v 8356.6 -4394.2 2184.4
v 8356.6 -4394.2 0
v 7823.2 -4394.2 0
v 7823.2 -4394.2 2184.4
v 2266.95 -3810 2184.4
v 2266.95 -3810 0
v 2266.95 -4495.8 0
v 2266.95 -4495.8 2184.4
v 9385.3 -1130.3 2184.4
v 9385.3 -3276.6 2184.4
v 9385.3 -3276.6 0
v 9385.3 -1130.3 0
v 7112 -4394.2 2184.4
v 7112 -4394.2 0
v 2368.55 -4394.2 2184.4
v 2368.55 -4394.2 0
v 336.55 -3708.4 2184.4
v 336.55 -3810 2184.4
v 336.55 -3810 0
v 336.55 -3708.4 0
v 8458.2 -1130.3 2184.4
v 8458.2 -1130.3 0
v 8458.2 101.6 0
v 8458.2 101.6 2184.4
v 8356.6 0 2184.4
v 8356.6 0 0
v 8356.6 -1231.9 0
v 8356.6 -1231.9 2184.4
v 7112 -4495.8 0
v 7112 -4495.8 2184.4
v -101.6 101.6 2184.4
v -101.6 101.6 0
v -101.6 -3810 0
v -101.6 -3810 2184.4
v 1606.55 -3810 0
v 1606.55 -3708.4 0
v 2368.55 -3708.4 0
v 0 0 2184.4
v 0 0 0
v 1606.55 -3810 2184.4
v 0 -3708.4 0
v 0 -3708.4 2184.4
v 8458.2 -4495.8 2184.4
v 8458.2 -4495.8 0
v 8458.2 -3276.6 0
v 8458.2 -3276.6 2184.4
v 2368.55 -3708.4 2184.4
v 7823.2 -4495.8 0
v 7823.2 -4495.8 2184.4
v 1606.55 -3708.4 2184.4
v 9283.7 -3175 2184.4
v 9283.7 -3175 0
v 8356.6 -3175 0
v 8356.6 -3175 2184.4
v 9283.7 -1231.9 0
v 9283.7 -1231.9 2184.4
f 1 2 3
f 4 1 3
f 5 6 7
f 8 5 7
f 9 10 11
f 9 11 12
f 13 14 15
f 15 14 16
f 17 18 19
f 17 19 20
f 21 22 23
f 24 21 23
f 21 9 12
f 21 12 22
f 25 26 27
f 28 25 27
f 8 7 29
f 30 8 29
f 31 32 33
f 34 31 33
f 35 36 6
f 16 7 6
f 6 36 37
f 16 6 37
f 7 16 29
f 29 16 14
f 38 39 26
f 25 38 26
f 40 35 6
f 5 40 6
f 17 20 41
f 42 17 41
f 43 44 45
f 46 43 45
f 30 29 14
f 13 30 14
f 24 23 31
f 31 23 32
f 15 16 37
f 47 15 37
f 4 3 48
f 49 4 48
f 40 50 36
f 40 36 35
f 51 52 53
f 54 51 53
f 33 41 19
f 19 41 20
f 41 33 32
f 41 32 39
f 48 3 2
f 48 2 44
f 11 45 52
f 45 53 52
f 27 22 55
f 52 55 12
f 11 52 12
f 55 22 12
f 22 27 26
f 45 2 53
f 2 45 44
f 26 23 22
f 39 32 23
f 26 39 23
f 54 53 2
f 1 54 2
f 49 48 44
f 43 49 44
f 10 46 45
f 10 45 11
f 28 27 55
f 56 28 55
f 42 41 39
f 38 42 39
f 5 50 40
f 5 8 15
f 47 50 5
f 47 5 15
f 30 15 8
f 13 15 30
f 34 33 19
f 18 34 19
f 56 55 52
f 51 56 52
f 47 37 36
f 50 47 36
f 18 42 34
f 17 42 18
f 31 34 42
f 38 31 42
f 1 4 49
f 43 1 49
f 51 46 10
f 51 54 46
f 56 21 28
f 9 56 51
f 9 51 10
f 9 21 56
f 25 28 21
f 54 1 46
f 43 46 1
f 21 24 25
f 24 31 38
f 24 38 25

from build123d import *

# Parameters (mm, degrees)
F1_DEPTH = 2184.4


with BuildPart() as f1:
    # F0 (on Top) → F1 (new body)
    with BuildSketch(Plane.XY):
        Polygon((0, -3708.4), (0, 0), (812.8, 0), (3048, 0), (8356.6, 0), (8356.6, -1231.9), (9283.7, -1231.9), (9283.7, -3175), (8356.6, -3175), (8356.6, -4394.2), (7823.2, -4394.2), (7823.2, -4495.8), (8458.2, -4495.8), (8458.2, -3276.6), (9385.3, -3276.6), (9385.3, -1130.3), (8458.2, -1130.3), (8458.2, 101.6), (5651.08757, 101.6), (-101.6, 101.6), (-101.6, -3810), (336.55, -3810), (336.55, -3708.4), align=None)
        Polygon((2368.55, -3708.4), (1606.55, -3708.4), (1606.55, -3810), (2266.95, -3810), (2266.95, -4495.8), (7112, -4495.8), (7112, -4394.2), (2368.55, -4394.2), align=None)
    extrude(amount=F1_DEPTH)


solid = f1.part
